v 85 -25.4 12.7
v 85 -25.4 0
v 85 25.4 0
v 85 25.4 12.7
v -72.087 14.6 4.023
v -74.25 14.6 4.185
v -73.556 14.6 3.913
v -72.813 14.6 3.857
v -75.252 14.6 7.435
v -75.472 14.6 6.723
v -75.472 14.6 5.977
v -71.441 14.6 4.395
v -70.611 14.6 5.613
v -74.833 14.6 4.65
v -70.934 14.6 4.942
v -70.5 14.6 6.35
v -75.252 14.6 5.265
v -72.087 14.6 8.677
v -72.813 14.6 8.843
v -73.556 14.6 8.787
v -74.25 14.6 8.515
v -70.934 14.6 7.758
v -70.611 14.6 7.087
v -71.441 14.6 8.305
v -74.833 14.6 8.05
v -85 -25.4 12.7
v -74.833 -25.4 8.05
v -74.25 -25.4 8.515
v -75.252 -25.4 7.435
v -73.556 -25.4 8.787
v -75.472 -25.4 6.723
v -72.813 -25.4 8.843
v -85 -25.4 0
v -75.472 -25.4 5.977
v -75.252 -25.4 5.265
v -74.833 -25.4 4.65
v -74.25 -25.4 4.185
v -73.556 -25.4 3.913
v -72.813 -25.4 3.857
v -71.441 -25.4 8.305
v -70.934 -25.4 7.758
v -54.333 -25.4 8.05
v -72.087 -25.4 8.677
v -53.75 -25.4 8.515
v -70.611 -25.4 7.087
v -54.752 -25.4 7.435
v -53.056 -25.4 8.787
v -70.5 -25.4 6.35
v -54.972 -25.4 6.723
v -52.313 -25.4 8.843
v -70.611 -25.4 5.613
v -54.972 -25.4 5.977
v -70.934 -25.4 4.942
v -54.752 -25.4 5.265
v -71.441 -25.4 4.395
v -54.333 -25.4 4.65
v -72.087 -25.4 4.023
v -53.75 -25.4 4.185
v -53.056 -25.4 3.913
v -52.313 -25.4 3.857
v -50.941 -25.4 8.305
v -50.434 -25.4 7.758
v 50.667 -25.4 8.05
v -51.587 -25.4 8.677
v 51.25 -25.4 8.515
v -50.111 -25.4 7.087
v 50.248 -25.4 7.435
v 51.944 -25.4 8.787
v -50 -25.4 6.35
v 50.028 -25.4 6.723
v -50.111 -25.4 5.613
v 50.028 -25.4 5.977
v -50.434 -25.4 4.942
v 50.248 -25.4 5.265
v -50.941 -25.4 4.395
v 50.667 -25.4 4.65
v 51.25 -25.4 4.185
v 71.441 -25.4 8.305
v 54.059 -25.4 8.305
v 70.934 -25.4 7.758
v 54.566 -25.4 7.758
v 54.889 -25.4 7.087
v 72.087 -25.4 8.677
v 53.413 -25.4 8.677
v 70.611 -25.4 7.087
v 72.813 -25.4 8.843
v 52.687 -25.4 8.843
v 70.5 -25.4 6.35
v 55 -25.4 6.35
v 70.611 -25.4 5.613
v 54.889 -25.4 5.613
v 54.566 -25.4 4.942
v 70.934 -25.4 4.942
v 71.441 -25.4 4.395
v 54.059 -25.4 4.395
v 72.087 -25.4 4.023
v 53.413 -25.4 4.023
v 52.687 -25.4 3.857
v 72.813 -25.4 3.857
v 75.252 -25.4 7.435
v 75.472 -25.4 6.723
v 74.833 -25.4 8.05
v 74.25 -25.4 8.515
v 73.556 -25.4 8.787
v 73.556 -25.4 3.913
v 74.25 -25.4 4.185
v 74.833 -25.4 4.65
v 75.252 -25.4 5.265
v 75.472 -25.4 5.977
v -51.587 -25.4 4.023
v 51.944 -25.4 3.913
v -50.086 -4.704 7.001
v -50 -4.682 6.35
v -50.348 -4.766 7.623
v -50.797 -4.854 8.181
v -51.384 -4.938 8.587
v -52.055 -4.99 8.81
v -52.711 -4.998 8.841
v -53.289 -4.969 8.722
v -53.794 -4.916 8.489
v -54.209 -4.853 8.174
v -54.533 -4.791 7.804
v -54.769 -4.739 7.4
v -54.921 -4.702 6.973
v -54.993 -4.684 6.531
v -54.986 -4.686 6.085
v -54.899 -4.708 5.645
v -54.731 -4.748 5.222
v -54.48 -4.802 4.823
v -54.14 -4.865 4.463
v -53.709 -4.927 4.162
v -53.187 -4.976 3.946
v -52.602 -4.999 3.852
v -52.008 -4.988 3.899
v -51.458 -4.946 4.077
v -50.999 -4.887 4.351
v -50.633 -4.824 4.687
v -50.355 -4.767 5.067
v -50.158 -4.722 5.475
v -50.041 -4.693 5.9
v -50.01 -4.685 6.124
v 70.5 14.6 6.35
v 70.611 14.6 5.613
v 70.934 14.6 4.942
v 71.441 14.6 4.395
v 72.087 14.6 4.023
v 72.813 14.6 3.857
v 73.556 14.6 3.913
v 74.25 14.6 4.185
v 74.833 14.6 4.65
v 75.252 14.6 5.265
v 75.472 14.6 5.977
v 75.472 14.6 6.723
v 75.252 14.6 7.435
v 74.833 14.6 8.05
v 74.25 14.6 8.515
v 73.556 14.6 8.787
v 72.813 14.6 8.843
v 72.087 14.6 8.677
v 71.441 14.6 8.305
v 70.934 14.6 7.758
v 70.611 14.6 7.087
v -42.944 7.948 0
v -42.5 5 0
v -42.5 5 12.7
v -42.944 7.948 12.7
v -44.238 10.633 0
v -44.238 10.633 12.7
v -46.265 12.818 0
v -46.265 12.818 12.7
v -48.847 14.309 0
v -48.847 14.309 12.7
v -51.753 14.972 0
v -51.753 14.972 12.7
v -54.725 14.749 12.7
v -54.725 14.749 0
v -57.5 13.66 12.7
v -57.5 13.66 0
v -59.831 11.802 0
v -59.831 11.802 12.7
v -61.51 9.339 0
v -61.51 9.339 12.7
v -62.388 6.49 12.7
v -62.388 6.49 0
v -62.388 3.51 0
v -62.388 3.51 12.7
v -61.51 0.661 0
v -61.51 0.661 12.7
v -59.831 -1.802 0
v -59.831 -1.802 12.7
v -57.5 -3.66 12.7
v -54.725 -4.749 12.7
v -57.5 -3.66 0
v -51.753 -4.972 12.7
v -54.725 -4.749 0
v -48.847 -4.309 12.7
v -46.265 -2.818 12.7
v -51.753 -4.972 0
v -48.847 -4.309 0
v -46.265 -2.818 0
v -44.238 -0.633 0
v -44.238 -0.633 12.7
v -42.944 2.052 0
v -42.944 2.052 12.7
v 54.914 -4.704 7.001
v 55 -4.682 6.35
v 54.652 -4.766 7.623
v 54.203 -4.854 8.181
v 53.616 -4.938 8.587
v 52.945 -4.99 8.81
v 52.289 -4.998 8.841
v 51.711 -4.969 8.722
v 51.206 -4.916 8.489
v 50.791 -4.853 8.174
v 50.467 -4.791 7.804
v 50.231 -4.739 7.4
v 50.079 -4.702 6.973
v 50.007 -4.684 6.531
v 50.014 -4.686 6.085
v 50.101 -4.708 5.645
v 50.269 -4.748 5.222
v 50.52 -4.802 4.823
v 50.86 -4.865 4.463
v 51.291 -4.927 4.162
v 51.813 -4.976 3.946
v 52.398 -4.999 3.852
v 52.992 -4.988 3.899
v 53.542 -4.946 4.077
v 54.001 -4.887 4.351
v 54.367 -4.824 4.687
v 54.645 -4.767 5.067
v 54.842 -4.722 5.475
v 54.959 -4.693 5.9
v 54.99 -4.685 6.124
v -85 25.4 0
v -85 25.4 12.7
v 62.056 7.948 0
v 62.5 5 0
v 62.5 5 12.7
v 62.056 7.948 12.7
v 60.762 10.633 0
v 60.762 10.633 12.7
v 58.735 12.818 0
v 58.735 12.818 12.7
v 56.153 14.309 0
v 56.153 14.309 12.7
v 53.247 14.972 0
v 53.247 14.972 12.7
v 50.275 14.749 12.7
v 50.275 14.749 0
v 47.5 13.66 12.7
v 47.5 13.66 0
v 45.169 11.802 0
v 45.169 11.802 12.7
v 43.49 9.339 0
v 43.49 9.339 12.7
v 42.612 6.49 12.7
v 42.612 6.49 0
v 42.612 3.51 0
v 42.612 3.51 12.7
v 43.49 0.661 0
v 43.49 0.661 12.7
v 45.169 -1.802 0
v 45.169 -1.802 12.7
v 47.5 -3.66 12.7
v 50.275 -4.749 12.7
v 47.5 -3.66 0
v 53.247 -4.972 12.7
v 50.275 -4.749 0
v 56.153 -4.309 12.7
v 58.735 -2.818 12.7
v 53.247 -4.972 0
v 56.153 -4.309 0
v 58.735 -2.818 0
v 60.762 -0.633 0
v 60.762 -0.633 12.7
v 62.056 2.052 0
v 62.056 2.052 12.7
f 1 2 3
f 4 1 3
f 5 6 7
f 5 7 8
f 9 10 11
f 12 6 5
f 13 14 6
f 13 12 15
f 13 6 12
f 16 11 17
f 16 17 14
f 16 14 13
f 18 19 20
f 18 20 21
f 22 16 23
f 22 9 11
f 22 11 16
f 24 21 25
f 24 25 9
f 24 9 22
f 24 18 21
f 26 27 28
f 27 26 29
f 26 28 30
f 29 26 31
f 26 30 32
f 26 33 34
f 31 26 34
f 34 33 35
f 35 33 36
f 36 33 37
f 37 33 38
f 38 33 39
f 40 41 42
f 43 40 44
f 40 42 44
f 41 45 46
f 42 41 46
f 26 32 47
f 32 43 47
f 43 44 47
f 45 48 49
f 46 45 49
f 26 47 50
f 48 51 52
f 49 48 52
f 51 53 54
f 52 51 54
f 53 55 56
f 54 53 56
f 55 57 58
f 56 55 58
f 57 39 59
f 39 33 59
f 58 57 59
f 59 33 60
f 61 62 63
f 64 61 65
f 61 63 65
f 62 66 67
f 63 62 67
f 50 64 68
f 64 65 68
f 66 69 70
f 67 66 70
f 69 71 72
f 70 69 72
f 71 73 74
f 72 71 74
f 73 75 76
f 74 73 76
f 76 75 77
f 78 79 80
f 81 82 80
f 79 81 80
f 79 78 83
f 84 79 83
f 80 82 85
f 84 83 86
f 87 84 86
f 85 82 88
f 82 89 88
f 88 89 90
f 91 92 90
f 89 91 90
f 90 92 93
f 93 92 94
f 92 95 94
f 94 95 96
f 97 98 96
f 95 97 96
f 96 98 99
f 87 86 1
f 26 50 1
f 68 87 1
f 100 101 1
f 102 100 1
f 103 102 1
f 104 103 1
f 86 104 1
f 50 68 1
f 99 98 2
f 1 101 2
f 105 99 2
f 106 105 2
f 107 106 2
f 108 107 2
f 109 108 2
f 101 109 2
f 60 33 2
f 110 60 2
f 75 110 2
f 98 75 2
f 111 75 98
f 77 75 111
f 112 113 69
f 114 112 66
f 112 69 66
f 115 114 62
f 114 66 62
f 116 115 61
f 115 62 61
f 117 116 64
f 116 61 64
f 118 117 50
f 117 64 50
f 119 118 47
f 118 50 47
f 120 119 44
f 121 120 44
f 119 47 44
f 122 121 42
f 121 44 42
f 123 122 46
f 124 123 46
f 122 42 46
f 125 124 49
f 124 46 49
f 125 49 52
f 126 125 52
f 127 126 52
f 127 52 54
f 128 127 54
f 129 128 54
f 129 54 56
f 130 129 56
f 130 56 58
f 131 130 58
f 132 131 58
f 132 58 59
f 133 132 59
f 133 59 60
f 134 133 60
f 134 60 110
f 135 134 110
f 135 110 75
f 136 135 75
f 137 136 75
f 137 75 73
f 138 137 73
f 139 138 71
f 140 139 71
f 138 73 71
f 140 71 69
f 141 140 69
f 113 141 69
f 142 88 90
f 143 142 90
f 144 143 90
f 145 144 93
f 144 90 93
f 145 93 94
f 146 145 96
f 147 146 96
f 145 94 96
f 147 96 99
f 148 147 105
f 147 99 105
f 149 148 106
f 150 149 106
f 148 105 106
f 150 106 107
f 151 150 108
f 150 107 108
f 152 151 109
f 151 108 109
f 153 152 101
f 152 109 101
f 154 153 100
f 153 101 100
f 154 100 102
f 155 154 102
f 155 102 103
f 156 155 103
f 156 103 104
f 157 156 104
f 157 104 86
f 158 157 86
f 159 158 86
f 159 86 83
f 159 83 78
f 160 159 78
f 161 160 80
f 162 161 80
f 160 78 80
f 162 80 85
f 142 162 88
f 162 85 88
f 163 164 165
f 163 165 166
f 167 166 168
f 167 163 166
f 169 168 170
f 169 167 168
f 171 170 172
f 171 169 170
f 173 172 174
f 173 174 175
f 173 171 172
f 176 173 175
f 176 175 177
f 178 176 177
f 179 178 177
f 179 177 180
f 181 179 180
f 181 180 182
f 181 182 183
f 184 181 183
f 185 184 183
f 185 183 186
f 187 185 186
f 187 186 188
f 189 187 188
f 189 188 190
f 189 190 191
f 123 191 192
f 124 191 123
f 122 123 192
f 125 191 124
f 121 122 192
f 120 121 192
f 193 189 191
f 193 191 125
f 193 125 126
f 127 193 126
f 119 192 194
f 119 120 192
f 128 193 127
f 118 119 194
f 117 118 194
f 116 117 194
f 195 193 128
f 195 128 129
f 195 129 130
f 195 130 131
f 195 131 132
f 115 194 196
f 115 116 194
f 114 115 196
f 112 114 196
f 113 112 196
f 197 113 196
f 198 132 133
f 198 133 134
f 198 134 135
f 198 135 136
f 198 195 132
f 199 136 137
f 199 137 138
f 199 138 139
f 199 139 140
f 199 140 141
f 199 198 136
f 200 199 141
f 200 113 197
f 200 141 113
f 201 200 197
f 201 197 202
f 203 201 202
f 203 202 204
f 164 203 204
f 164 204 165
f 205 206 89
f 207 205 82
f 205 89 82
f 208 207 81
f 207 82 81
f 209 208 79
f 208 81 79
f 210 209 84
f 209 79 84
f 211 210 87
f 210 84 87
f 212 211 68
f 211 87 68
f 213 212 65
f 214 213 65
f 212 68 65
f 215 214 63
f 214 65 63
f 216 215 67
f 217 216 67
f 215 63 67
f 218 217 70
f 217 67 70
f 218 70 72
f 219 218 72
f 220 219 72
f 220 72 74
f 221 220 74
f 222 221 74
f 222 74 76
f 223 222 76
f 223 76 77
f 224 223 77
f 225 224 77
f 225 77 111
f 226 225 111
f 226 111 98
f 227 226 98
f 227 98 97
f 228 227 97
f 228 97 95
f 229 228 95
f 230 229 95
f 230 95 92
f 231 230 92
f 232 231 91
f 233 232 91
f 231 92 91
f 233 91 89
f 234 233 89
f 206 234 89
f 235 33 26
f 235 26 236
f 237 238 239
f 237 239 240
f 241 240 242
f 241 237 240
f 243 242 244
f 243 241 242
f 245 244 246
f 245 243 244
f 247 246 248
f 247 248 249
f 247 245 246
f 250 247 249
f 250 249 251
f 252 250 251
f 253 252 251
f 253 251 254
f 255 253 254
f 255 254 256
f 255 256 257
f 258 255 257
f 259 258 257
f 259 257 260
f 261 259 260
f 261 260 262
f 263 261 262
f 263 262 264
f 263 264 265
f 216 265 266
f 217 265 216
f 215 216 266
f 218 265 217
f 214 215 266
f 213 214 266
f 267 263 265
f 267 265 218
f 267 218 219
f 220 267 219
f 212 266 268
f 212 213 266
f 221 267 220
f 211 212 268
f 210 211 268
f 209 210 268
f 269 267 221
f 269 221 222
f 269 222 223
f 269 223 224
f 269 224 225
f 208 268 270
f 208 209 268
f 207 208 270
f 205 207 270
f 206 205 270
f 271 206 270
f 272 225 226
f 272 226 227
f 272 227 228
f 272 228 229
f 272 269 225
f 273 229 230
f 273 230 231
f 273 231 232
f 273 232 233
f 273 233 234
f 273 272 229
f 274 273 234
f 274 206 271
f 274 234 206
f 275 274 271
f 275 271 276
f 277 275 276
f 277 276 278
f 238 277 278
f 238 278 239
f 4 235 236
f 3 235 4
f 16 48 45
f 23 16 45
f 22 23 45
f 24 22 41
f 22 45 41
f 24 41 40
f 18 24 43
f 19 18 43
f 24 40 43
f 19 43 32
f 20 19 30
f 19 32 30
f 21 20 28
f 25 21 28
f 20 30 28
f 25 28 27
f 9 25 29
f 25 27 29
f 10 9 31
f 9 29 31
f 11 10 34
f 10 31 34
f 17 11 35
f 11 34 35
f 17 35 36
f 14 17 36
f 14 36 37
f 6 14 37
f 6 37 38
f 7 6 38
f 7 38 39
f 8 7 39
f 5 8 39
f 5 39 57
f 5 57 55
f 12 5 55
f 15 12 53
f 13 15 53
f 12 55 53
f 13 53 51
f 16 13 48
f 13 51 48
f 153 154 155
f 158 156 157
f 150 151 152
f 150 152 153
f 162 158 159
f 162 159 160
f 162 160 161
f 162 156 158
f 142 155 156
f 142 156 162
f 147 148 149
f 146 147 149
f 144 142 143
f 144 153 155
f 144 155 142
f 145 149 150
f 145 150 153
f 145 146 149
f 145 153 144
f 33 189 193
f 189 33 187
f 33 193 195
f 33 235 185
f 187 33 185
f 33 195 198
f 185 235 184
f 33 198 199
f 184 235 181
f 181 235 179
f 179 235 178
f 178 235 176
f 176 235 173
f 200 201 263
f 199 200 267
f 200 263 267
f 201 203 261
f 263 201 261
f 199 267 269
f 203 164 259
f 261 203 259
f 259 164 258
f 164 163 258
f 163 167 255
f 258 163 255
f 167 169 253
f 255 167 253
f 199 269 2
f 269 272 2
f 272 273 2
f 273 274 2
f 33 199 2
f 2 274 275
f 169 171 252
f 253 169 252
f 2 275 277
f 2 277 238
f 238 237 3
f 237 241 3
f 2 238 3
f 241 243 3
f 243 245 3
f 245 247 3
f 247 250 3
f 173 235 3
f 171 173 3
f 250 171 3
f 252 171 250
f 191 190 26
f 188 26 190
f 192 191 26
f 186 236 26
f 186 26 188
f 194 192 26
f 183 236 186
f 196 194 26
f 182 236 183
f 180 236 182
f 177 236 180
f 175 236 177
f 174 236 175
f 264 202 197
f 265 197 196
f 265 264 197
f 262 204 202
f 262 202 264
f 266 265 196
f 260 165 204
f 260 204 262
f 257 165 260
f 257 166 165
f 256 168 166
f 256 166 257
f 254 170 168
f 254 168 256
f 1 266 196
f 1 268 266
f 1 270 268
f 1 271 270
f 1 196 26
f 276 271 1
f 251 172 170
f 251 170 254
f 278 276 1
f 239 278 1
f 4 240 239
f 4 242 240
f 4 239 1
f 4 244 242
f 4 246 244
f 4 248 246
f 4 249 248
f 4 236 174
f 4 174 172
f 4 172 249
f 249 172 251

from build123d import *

# Parameters (mm, degrees)
CROQUIS1_W              = 170
CROQUIS1_H              = 50.8
CROQUIS1_R              = 10
SALIENTE_EXTRUIR1_DEPTH = 12.7
CROQUIS2_R              = 2.5
CORTAR_EXTRUIR1_DEPTH   = 32.7
CROQUIS3_R              = 2.5
CORTAR_EXTRUIR2_DEPTH   = 40


with BuildPart() as part:
    # Croquis1 → Saliente-Extruir1 (new body)
    with BuildSketch(Plane.XY):
        Rectangle(CROQUIS1_W, CROQUIS1_H)
        with Locations((52.5, 5)):
            Circle(CROQUIS1_R, mode=Mode.SUBTRACT)
        with Locations((-52.5, 5)):
            Circle(CROQUIS1_R, mode=Mode.SUBTRACT)
    extrude(amount=SALIENTE_EXTRUIR1_DEPTH)

    # Croquis2 → Cortar-Extruir1 (cut)
    with BuildSketch(Plane.XZ.offset(25.4)):
        with Locations((-52.5, 6.35)):
            Circle(CROQUIS2_R)
        with Locations((52.5, 6.35)):
            Circle(CROQUIS2_R)
    extrude(amount=-CORTAR_EXTRUIR1_DEPTH, mode=Mode.SUBTRACT)

    # Croquis3 → Cortar-Extruir2 (cut)
    with BuildSketch(Plane.XZ.offset(25.4)):
        with Locations((-73, 6.35)):
            Circle(CROQUIS3_R)
        with Locations(Location((73, 6.35, 0), (0, 0, 180))):
            Circle(CROQUIS3_R)
    extrude(amount=-CORTAR_EXTRUIR2_DEPTH, mode=Mode.SUBTRACT)


solid = part.part
